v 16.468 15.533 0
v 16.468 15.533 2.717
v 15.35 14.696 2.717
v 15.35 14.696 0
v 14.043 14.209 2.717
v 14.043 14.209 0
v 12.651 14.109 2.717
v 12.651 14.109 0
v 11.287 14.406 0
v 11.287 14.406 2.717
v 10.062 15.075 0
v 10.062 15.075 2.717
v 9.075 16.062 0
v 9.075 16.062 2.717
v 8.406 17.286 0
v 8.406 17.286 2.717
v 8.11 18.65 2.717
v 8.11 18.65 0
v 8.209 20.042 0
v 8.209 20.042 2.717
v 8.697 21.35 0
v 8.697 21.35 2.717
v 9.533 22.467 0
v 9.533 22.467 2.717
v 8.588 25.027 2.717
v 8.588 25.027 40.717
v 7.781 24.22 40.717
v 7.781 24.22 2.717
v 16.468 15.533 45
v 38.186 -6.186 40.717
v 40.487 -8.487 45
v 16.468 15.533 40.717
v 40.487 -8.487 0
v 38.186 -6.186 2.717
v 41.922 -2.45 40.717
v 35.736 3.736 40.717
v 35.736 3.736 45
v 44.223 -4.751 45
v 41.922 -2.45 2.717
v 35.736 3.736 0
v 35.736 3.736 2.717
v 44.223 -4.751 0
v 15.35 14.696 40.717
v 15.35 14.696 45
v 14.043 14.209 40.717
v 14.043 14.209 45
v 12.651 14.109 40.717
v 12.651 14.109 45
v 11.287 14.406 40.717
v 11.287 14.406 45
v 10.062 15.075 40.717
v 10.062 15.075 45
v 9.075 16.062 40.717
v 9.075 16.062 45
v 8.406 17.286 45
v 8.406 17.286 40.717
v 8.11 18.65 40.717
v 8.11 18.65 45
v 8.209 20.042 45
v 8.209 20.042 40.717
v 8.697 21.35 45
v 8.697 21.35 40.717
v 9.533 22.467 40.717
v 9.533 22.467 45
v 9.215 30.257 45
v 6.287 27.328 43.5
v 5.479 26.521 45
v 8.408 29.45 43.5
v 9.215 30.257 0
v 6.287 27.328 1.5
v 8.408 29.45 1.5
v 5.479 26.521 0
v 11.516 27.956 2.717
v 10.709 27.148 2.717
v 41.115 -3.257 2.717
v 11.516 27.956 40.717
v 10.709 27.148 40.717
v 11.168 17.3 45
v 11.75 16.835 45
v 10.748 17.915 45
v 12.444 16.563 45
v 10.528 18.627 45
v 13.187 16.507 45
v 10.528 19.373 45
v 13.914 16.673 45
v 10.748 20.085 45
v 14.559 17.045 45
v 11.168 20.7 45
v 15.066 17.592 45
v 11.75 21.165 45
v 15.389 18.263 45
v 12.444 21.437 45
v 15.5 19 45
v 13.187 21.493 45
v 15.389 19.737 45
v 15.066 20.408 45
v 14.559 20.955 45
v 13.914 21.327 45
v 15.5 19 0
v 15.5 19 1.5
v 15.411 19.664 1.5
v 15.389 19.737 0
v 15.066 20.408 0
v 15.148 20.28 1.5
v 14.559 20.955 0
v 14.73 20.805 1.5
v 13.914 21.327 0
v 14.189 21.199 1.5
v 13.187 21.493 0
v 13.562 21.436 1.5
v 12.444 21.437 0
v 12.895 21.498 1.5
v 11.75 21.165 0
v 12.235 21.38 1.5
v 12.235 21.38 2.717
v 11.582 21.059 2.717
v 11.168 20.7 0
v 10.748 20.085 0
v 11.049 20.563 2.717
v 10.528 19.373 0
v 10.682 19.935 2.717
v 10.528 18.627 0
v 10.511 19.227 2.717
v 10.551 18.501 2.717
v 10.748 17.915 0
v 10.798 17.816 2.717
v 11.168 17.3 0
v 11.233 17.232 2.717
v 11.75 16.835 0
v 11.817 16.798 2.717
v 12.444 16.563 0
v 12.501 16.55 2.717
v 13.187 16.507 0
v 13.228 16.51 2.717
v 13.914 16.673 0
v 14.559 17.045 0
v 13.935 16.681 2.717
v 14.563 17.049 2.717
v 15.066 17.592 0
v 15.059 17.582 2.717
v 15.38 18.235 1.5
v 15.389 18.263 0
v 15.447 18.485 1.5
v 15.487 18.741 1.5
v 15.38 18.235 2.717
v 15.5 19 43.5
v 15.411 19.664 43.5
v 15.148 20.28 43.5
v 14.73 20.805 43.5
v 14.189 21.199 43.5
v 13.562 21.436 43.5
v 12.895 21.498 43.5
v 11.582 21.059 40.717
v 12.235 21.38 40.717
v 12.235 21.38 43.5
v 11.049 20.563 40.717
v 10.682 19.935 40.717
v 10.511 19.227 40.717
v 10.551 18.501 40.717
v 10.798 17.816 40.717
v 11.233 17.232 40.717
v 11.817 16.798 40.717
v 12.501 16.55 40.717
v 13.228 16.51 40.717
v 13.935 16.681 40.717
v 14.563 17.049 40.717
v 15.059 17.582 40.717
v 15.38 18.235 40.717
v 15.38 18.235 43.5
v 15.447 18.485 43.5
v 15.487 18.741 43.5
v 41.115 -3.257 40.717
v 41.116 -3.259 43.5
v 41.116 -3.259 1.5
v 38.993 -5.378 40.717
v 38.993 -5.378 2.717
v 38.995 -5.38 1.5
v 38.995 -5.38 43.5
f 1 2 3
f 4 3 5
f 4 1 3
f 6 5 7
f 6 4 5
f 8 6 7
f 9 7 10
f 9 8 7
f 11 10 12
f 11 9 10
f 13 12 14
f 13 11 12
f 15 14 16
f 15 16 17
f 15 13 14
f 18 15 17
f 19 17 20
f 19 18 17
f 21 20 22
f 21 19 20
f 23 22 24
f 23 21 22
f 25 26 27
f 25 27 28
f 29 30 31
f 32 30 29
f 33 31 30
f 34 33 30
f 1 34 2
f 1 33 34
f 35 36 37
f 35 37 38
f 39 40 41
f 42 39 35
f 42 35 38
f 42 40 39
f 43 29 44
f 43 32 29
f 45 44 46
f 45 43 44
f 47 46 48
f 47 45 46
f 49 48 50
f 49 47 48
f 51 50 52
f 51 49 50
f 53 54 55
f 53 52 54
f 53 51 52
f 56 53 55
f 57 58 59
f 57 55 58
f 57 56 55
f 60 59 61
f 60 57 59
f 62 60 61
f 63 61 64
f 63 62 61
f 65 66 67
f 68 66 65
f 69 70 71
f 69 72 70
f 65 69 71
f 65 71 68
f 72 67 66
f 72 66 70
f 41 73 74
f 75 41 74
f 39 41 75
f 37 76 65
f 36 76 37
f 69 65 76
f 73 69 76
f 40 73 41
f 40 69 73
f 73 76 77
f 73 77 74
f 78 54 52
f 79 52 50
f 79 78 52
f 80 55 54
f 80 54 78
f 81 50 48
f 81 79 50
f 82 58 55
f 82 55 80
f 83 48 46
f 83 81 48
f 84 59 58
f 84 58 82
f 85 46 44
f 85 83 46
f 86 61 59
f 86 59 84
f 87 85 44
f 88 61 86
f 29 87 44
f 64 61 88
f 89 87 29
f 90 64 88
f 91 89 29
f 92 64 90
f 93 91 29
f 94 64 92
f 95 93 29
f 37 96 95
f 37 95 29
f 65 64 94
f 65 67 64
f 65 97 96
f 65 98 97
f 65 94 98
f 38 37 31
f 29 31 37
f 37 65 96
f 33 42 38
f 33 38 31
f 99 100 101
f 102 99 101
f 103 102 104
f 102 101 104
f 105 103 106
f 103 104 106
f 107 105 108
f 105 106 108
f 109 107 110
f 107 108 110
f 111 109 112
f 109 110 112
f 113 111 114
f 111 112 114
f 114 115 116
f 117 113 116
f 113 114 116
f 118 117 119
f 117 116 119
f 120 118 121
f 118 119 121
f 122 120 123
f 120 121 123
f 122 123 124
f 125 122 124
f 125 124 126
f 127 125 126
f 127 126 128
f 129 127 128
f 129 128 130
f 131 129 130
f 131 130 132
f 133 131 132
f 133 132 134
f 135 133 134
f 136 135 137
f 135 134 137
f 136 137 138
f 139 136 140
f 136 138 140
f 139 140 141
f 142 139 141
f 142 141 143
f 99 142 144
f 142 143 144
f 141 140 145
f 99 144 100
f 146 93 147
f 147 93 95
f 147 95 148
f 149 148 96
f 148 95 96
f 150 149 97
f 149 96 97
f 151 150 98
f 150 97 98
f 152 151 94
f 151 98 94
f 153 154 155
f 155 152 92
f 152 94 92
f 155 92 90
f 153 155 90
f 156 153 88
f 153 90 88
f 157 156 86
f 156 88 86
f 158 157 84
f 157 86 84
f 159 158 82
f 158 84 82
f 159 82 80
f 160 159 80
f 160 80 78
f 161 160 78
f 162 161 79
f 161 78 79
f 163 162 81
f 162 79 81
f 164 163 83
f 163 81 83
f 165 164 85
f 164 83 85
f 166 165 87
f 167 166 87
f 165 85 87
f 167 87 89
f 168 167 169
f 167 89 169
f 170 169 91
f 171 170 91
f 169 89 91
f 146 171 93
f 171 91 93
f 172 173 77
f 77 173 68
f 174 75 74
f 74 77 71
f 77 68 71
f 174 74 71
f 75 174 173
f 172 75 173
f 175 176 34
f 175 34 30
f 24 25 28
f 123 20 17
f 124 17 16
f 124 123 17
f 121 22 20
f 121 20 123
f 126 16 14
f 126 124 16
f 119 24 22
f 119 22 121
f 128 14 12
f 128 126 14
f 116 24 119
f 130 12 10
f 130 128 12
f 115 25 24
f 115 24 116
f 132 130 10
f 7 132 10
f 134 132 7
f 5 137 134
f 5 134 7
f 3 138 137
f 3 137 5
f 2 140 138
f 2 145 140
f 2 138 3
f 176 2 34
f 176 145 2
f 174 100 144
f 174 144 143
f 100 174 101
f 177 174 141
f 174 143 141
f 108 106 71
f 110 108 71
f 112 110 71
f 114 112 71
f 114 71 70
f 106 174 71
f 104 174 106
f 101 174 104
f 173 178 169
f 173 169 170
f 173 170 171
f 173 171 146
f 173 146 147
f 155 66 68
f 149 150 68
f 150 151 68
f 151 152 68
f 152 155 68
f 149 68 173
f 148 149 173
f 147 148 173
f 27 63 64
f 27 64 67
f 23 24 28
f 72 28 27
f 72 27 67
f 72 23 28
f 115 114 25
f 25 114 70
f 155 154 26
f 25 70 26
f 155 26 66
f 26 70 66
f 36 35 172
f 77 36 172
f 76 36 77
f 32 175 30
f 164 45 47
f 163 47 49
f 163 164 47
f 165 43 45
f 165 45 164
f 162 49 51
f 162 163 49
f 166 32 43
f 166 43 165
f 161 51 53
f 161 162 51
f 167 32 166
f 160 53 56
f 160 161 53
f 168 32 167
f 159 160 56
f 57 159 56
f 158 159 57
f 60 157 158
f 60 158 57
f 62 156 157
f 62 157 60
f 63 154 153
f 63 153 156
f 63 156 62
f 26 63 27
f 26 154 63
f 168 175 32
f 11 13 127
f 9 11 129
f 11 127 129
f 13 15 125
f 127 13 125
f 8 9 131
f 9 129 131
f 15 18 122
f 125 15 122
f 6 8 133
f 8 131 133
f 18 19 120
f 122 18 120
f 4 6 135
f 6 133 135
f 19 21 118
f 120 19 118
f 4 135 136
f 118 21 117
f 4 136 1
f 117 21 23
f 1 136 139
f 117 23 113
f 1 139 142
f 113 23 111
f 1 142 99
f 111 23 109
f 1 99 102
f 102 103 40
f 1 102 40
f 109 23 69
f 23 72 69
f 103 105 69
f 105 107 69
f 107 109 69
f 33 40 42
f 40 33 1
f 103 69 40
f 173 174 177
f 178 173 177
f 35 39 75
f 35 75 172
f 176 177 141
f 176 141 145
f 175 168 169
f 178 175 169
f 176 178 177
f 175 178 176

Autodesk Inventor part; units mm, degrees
ref_plane "YZ Plane" through (0, 0, 0) normal (1, 0, 0) x (0, 1, 0)
ref_plane "XZ Plane" through (0, 0, 0) normal (0, 1, 0) x (-1, 0, 0)
ref_plane "XY Plane" through (0, 0, 0) normal (0, 0, 1) x (1, 0, 0)
sketch "Skizze1" plane through (0, 0, 0) normal (0, 0, 1) x (1, 0, 0)
  circle A0 centre (13.0004, 19) radius 2.5 projected
  arc A1 (45.6946, 0) -> (10.6946, 35) centre (10.6946, 0) ccw projected
  line L0 (-4, 35) -> (10.6946, 35) projected
  line L1 (-4, 0) -> (-4, 35) projected
  line L2 (45.6946, 0) -> (-4, 0) projected
  line L3 (13.0004, -80.4986) -> (13.0004, 19) construction
  line L4 (13.0004, 19) -> (-57.6019, 19) construction
  line L5 (13.0004, 19) -> (40.4873, -8.4869) construction
  line L6 (13.0004, 19) -> (51.8727, 19) construction
  line L7 (32.0004, 0) -> (5.4793, 26.5211)
  line L8 (5.4793, 26.5211) -> (9.215, 30.2568)
  line L9 (9.215, 30.2568) -> (35.7361, 3.7357)
  line L10 (35.7361, 3.7357) -> (32.0004, 0)
  circle A2 centre (13.0004, 19) radius 4.9033
  line L11 (32.0004, 0) -> (35.7361, 3.7357)
  line L12 (35.7361, 3.7357) -> (44.223, -4.7511)
  line L13 (44.223, -4.7511) -> (40.4873, -8.4869)
  line L14 (40.4873, -8.4869) -> (32.0004, 0)
  point P0 (0, 0)
  dimension "d0" = 45
extrude "Extrusion1" add sketch "Skizze1" along normal blind 45 contours A0 L7 | A0 L7 A2 | L7 A0 | A0 L7 A2 | L7 L8 L9 L10 A2 | L10 L12 L2 | L2 L12 L13 L14
sketch "Skizze2" plane through (0, 0, 45) normal (0, 0, 1) x (1, 0, 0)
  circle A0 centre (13.0004, 19) radius 2.5 projected
  point P0 (0, 0)
extrude "Extrusion2" cut sketch "Skizze2" against normal through all
sketch "Skizze3" plane through (9.215, 30.2568, 0) normal (0.7071, 0.7071, 0) x (-0.7071, 0.7071, 0)
  point P0 (-14.8788, 0)
sketch "Skizze4" plane through (9.215, 30.2568, 0) normal (0.7071, 0.7071, 0) x (-0.7071, 0.7071, 0)
  line L0 (-49.5087, 0) -> (0, 0) projected
  line L1 (0, 0) -> (0, 45) projected
  line L2 (-49.5087, 45) -> (0, 45) projected
  line L3 (-49.5087, 0) -> (-49.5087, 45) projected
  line L4 (-3.2544, 2.717) -> (-46.2544, 2.717)
  line L5 (-46.2544, 2.717) -> (-46.2544, 40.717)
  line L6 (-46.2544, 40.717) -> (-3.2544, 40.717)
  line L7 (-3.2544, 40.717) -> (-3.2544, 2.717)
  line L8 (-3.2544, 2.717) -> (-46.2544, 40.717) construction
  line L9 (-46.2544, 2.717) -> (-3.2544, 40.717) construction
  point P0 (-14.8788, 0)
  point P1 (-24.7544, 21.717)
  dimension "d5" = 43
  dimension "d6" = 38
extrude "Extrusion3" cut sketch "Skizze4" against normal blind 12 contours L4 L5 L6 L7
sketch "Skizze6" plane through (5.4793, 26.5211, 0) normal (-0.7071, 0.7071, 0) x (-0.7071, -0.7071, 0)
  line L0 (-5.2831, 0) -> (0, 0) projected
  line L1 (0, 0) -> (0, 45) projected
  line L2 (-5.2831, 45) -> (0, 45) projected
  line L3 (-5.2831, 0) -> (-5.2831, 45) projected
  line L4 (-4.1416, 1.5) -> (-1.1416, 1.5)
  line L5 (-1.1416, 1.5) -> (-1.1416, 43.5)
  line L6 (-1.1416, 43.5) -> (-4.1416, 43.5)
  line L7 (-4.1416, 43.5) -> (-4.1416, 1.5)
  line L8 (-4.1416, 1.5) -> (-1.1416, 43.5) construction
  line L9 (-1.1416, 1.5) -> (-4.1416, 43.5) construction
  point P0 (22.6277, 0)
  point P1 (-2.6416, 22.5)
  dimension "d11" = 3
  dimension "d12" = 42
extrude "Extrusion5" cut sketch "Skizze6" against normal up to surface (46.2544 mm away) contours L7 L6 L5 L4
properties part number "17_Spiegelhalterung"
